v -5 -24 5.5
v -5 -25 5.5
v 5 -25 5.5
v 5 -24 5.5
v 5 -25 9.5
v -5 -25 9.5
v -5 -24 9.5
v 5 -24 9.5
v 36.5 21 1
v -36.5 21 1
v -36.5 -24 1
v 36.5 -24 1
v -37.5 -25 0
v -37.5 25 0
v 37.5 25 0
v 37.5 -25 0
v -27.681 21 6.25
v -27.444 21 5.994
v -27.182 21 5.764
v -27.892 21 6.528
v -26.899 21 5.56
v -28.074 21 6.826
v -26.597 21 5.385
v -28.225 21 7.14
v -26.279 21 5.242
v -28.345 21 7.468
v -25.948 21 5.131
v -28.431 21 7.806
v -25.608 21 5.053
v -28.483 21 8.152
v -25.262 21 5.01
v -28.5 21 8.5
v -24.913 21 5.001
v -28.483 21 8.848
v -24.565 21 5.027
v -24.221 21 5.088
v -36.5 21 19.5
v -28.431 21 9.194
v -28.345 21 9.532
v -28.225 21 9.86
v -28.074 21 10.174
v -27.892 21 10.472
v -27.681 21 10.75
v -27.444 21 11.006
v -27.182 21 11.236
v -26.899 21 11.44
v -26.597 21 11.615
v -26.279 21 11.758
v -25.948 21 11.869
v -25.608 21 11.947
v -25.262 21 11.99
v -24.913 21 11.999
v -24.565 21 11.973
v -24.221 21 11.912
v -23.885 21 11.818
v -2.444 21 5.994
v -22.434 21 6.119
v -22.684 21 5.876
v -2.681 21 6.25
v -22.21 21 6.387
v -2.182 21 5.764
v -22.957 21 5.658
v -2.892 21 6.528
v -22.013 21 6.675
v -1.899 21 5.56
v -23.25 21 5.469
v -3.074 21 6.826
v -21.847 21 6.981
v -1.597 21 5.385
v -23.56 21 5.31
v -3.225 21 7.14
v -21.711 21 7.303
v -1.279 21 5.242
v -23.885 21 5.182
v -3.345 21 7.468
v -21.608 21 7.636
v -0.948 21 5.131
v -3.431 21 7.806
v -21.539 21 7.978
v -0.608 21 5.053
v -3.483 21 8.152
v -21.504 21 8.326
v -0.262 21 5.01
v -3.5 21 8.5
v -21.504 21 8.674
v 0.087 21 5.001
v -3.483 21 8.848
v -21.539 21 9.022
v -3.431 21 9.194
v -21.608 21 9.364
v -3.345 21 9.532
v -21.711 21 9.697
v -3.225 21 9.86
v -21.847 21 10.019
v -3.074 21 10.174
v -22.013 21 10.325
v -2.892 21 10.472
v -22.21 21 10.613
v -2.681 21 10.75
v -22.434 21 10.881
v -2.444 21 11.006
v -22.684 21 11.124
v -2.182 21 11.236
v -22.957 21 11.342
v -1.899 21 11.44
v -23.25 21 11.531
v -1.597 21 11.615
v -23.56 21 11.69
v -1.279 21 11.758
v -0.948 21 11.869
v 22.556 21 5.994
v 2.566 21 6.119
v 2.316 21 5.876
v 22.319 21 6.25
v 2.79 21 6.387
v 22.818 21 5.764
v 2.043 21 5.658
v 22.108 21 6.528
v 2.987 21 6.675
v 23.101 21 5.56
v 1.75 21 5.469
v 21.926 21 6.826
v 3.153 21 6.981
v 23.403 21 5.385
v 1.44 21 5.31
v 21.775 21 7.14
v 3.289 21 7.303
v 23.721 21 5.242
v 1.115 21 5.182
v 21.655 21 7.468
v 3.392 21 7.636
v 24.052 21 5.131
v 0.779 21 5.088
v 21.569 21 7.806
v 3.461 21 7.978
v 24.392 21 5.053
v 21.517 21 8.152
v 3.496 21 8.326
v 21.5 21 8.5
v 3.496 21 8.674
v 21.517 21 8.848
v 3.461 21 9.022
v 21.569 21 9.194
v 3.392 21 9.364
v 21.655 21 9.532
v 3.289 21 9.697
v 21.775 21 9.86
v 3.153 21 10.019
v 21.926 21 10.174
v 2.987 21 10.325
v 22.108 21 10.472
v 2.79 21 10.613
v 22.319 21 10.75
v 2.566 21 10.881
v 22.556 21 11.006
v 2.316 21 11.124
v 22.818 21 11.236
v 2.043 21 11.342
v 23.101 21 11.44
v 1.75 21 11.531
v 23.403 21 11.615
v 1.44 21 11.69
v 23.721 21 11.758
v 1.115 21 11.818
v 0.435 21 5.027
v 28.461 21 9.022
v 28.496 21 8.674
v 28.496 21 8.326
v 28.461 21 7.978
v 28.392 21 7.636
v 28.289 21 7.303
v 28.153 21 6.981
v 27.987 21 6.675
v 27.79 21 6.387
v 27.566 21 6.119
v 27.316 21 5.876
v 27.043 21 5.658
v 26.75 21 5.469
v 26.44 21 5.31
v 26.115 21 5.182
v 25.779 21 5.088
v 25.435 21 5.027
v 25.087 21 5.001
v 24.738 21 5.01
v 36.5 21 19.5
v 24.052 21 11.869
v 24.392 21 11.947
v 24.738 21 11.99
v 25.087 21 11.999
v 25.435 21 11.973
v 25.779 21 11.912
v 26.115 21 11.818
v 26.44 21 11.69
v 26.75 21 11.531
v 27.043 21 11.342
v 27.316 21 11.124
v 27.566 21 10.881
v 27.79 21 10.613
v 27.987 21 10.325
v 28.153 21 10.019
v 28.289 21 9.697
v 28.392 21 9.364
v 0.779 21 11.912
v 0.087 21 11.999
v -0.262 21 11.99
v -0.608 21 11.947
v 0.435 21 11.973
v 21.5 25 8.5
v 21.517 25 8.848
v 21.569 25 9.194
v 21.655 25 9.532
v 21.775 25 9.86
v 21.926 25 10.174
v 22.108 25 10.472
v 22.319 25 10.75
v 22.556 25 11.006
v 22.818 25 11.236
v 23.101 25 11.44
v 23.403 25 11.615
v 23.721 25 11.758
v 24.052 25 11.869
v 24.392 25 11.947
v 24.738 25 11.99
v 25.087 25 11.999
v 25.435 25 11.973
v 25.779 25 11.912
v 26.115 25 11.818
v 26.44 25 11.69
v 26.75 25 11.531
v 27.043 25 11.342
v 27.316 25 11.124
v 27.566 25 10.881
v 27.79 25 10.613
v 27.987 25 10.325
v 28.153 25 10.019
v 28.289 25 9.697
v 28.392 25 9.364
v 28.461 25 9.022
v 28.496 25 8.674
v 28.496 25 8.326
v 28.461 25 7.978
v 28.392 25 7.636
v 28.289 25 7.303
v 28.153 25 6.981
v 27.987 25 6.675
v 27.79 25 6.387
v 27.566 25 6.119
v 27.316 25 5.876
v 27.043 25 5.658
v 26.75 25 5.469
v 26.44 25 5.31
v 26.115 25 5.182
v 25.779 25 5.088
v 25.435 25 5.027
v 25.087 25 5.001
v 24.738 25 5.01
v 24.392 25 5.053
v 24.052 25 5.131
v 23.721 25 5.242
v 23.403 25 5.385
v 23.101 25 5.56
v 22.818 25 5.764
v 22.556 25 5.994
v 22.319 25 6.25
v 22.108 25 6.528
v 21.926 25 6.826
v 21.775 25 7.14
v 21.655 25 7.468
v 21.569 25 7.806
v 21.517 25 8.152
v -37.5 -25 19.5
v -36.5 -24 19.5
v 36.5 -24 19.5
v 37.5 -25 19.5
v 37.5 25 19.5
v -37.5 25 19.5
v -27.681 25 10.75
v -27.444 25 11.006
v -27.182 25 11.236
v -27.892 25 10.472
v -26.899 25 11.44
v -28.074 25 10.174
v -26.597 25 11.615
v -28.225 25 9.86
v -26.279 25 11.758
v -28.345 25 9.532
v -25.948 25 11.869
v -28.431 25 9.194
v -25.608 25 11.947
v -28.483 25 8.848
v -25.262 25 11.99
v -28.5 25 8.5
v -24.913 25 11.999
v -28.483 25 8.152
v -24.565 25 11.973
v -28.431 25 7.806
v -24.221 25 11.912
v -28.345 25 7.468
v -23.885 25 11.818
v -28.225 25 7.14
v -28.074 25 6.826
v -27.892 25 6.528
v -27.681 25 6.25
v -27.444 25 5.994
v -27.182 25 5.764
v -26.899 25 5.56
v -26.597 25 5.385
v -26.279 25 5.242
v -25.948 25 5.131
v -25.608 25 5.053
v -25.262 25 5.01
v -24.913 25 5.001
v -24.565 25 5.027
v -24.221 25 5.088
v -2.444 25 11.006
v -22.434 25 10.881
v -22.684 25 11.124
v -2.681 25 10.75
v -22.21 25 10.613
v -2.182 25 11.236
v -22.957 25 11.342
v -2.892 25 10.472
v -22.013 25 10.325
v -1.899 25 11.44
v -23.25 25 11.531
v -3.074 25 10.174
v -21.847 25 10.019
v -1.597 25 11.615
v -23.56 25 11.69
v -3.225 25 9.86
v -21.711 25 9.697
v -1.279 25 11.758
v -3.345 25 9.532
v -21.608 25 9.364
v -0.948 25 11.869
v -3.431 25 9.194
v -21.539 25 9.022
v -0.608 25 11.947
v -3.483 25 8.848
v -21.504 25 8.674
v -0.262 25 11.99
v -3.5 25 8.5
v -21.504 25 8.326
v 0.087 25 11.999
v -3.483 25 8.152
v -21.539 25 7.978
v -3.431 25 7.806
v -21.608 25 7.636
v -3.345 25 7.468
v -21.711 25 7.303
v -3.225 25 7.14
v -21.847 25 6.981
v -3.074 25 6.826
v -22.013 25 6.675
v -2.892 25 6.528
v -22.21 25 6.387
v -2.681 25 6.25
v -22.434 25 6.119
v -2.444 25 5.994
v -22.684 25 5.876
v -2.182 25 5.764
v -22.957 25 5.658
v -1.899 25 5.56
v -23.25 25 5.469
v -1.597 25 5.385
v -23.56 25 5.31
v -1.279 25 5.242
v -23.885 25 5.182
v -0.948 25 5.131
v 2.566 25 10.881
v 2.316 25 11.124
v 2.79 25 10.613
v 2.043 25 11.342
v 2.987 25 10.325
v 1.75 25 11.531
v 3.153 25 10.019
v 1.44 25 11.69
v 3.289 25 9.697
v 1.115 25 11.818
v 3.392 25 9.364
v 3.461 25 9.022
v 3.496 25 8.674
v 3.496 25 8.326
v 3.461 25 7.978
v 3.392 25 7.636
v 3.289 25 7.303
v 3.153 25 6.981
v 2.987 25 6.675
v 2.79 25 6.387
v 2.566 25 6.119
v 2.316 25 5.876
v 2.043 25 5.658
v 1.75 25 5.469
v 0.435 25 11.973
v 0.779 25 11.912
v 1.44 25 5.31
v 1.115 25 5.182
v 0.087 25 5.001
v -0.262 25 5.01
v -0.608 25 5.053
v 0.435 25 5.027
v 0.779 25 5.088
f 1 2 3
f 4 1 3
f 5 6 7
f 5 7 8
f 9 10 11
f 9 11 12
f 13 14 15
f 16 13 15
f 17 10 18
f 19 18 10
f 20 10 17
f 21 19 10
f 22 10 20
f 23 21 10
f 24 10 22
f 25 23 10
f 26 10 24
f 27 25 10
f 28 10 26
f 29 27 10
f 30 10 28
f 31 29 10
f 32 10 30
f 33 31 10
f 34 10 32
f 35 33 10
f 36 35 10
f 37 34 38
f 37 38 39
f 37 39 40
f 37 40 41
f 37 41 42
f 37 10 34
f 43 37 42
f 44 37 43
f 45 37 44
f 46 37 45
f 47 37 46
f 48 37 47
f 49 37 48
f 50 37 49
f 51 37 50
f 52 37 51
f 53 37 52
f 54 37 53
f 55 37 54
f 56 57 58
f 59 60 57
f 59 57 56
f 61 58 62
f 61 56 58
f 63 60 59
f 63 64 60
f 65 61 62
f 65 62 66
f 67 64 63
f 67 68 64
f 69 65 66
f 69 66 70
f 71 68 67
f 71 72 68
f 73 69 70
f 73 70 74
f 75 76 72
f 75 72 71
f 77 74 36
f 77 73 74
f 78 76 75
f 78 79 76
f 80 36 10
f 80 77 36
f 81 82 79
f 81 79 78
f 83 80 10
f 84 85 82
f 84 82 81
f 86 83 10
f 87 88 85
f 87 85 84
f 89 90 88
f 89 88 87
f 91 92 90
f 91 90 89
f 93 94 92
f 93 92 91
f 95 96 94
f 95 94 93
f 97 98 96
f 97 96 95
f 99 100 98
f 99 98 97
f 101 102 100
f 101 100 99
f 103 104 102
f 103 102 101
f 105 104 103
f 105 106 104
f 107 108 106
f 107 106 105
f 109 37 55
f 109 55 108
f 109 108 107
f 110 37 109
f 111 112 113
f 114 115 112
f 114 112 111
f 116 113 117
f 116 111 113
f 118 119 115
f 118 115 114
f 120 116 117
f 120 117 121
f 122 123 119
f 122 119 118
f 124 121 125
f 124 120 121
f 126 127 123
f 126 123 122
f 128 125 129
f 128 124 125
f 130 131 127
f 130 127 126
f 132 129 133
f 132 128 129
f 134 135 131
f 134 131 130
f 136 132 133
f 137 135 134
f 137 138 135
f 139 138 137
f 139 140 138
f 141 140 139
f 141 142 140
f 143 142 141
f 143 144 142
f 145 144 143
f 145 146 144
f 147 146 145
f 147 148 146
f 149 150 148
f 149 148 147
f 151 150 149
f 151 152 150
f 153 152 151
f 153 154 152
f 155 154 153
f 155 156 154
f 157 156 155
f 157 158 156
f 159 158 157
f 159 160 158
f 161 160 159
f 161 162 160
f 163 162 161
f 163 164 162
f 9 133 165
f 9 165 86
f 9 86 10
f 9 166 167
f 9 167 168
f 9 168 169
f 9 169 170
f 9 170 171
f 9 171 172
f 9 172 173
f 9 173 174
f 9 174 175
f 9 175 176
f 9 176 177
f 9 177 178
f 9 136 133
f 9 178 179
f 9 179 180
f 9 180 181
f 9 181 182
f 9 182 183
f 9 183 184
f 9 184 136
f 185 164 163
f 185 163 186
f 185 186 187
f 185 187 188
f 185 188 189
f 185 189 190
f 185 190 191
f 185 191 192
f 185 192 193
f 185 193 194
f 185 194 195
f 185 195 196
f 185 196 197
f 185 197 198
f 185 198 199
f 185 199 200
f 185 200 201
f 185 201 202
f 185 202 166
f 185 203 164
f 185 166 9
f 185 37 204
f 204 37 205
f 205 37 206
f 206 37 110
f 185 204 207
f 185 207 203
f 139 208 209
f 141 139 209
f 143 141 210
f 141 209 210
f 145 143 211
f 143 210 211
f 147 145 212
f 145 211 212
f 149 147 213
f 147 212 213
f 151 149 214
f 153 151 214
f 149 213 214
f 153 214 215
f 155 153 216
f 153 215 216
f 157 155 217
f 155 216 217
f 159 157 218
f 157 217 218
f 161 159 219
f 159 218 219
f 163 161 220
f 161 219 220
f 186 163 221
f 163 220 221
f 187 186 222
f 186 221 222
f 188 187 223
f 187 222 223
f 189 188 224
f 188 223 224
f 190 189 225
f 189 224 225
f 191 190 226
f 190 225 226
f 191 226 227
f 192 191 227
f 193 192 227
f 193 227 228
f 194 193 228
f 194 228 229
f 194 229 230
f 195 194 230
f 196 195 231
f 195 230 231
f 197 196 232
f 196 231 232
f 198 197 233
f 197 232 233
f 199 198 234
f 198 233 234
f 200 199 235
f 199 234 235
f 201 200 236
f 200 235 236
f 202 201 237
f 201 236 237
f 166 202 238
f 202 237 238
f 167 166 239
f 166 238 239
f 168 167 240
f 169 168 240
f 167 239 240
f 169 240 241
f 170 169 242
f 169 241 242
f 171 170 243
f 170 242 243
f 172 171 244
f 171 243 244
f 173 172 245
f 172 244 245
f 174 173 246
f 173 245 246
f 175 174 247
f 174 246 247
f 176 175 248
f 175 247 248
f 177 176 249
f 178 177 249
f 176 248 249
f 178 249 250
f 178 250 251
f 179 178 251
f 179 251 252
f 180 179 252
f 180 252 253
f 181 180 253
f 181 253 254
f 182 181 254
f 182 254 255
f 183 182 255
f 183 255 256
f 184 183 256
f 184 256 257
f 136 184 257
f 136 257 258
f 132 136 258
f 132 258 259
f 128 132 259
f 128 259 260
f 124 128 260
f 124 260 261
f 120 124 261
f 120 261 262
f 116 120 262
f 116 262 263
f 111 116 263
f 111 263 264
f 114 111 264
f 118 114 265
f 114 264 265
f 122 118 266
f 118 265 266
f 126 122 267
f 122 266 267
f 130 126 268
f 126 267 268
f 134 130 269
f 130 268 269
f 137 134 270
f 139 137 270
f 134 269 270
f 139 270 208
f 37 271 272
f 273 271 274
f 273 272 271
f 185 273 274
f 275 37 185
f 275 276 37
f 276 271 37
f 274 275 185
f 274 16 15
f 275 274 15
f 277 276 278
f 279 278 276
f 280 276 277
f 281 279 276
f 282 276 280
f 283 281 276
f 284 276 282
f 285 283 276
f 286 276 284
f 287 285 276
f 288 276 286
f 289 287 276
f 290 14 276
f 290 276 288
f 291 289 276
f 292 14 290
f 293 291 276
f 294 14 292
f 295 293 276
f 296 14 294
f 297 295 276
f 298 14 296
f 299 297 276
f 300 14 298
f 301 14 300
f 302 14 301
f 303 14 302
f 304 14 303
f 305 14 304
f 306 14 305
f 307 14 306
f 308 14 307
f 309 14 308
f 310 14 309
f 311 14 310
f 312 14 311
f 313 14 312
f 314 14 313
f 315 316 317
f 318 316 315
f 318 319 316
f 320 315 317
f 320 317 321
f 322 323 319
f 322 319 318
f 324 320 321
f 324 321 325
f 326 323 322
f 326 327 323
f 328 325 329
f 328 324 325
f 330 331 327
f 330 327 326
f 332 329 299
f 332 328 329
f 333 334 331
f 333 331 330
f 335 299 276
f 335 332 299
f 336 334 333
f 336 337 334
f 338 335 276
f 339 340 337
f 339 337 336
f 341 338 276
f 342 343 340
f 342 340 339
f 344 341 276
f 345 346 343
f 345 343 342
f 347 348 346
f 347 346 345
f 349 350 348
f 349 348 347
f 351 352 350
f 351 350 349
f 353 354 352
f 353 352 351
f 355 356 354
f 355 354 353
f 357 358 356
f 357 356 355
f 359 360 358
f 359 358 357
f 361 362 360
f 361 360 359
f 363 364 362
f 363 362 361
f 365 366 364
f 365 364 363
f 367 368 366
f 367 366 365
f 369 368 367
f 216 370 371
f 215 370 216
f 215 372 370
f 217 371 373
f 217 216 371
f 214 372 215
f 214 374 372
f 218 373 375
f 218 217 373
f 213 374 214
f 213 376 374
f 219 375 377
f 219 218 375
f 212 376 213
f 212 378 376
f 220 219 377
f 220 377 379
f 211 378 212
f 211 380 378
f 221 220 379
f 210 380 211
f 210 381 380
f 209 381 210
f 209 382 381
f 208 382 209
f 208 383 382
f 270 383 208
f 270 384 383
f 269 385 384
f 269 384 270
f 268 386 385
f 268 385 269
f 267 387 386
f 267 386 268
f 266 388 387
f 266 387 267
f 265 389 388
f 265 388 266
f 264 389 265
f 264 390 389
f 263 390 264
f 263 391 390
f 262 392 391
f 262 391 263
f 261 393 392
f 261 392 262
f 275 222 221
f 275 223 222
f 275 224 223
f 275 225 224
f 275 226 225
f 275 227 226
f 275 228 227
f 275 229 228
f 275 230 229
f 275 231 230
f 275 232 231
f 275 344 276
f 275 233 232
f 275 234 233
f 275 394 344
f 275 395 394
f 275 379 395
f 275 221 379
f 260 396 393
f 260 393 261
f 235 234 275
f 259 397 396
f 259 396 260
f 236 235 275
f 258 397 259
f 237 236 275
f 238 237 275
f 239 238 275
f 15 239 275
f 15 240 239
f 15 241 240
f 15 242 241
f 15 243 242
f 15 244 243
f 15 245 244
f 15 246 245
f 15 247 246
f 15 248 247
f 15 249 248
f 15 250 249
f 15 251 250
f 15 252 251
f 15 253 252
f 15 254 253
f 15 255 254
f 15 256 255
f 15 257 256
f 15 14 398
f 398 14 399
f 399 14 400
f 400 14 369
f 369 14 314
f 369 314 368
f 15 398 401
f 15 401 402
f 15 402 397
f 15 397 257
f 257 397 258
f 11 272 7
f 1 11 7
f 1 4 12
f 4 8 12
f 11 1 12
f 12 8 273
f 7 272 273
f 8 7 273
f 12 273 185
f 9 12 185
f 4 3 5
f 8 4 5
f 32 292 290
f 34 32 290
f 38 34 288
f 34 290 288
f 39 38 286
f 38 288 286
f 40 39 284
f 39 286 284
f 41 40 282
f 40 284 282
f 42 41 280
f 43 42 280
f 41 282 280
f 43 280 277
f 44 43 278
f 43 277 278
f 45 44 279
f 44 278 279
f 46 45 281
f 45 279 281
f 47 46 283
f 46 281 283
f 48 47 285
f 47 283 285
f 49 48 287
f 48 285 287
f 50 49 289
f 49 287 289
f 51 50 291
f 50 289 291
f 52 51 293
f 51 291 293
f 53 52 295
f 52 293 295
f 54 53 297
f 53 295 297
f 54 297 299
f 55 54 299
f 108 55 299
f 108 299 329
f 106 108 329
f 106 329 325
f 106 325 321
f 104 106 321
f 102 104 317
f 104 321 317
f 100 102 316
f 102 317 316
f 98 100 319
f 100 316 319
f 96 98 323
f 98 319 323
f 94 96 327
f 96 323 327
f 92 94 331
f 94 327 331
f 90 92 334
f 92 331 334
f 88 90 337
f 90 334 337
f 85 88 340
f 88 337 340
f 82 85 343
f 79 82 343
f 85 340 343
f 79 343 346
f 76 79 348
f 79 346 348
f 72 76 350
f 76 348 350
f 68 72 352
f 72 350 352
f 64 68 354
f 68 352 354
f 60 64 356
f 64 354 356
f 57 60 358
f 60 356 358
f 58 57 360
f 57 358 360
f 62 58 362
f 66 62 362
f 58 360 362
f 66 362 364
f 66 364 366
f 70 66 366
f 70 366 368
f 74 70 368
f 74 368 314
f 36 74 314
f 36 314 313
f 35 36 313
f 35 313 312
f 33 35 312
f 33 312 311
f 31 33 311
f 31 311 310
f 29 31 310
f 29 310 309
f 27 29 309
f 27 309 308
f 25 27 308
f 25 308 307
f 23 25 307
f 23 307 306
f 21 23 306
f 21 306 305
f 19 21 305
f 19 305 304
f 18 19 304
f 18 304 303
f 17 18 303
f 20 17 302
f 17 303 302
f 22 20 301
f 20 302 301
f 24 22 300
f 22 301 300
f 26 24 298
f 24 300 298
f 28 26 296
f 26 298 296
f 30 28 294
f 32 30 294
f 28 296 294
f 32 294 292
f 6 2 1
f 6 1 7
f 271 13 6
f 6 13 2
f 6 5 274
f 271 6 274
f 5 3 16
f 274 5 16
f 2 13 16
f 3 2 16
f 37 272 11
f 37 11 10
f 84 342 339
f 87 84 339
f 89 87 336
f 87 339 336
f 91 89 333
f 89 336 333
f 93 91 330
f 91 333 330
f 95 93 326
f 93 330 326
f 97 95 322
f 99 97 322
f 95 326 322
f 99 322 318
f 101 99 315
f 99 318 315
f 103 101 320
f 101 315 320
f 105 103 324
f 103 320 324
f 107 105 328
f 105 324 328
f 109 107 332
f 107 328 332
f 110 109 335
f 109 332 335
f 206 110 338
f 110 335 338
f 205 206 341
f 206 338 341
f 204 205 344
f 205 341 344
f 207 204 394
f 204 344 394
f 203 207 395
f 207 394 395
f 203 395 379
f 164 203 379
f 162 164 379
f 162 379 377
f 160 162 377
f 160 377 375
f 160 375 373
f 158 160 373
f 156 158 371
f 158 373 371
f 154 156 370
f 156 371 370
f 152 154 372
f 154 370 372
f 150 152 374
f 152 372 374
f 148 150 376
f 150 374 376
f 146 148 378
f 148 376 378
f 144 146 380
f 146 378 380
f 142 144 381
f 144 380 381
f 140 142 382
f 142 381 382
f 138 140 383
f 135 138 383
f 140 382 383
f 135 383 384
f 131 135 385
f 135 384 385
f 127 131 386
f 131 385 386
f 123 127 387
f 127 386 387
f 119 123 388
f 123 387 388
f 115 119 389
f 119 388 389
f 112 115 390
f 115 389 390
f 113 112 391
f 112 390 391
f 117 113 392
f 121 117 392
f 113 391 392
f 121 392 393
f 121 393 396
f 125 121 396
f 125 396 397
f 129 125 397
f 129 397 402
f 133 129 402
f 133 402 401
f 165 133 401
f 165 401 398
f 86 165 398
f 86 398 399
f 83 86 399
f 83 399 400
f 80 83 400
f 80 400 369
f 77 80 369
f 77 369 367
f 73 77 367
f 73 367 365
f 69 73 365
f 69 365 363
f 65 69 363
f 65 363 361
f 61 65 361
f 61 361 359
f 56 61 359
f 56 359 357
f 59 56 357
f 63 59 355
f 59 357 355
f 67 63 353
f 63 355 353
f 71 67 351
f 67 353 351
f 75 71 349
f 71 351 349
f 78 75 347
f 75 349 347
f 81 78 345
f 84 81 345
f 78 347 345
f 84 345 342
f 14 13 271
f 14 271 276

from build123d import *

# Parameters (mm, degrees)
F2_W     = 75
F2_H     = 50
F3_DEPTH = 19.5
F4_W     = 73
F4_H     = 45
F5_DEPTH = 18.5
F6_W     = 10
F6_H     = 4
F7_DEPTH = 1
F8_R     = 3.5
F9_DEPTH = 4


with BuildPart() as f3:
    # F2 (on Top) → F3 (new body)
    with BuildSketch(Plane.XY):
        Rectangle(F2_W, F2_H)
    extrude(amount=F3_DEPTH)

    # F4 (on face) → F5 (cut)
    with BuildSketch(Plane.XY.offset(19.5)):
        with Locations((0, -1.5)):
            Rectangle(F4_W, F4_H)
    extrude(amount=-F5_DEPTH, mode=Mode.SUBTRACT)

    # F6 (on face) → F7 (cut, through all)
    with BuildSketch(Plane.XZ.offset(25)):
        with Locations((0, 7.5)):
            Rectangle(F6_W, F6_H)
    extrude(amount=-F7_DEPTH, mode=Mode.SUBTRACT)

    # F8 (on face) → F9 (cut, through all)
    with BuildSketch(Plane(origin=(0, 25, 0), x_dir=(-1, 0, 0), z_dir=(0, 1, 0))):
        with Locations((-25, 8.5)):
            Circle(F8_R)
        with Locations((0, 8.5)):
            Circle(F8_R)
        with Locations((25, 8.5)):
            Circle(F8_R)
    extrude(amount=-F9_DEPTH, mode=Mode.SUBTRACT)


solid = f3.part
